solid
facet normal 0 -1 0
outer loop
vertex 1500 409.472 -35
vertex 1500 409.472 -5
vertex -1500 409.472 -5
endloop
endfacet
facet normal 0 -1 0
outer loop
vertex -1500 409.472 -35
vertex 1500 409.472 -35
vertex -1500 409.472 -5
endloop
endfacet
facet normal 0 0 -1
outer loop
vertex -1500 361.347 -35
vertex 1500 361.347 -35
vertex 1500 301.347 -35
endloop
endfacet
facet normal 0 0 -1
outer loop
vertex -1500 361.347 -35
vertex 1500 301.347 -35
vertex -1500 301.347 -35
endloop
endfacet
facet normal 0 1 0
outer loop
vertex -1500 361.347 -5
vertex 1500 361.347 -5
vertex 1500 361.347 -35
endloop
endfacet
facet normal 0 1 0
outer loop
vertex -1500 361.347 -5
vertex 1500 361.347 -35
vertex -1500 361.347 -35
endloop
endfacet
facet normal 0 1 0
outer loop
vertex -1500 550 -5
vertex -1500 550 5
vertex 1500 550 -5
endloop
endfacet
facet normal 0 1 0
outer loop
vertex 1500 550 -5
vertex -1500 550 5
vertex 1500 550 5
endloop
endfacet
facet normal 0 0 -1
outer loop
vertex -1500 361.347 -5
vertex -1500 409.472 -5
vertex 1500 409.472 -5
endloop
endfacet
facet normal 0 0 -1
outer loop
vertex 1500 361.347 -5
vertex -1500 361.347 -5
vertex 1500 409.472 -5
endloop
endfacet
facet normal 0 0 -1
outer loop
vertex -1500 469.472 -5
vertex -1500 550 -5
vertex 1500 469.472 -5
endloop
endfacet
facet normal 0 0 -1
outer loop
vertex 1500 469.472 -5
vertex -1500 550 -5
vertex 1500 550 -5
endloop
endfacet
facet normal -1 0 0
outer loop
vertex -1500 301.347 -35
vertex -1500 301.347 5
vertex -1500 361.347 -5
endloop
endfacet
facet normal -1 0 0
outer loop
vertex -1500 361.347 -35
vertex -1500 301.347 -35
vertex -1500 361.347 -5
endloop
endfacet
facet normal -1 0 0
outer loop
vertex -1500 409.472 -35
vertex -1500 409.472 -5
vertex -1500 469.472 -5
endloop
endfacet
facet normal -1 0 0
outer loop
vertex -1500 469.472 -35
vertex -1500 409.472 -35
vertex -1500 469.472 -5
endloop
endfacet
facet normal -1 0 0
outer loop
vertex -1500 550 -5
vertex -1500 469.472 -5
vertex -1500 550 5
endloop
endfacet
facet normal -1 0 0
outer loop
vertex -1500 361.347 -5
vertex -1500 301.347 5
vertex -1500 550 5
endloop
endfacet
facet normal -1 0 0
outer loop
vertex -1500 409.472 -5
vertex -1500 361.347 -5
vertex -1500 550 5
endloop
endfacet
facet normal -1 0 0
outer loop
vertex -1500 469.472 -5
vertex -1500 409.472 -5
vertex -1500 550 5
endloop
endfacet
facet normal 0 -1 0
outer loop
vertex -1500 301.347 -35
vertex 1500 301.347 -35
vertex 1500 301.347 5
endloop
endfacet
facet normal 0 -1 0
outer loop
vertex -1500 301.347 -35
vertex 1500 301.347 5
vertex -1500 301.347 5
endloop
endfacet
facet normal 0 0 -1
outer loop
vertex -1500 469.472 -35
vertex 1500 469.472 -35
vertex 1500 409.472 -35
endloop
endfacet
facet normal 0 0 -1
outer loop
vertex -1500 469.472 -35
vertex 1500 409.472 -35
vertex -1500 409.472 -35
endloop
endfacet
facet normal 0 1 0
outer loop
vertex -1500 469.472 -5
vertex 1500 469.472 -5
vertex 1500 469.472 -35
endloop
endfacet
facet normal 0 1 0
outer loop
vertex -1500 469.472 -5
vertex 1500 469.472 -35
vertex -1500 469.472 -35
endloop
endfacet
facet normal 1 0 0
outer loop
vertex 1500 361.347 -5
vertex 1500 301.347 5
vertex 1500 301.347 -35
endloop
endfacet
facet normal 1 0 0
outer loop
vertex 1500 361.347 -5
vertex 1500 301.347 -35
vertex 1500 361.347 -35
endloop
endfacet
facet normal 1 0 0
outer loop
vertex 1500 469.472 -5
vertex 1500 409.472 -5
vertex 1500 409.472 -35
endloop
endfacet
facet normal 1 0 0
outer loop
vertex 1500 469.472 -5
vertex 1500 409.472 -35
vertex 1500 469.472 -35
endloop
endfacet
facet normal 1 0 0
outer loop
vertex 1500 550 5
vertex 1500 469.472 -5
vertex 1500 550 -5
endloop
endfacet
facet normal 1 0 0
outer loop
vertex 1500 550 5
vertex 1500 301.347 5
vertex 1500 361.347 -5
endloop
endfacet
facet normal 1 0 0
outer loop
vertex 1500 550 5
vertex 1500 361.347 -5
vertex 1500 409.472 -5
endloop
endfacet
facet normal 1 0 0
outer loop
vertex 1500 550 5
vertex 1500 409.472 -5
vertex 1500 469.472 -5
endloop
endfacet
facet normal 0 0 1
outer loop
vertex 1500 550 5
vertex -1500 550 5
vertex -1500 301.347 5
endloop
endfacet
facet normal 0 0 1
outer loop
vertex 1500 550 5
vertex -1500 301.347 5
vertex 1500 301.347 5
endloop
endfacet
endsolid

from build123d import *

# Parameters (mm, degrees)
SKETCH1_W           = 3000
SKETCH1_H           = 1100
BOSS_EXTRUDE1_DEPTH = 5
SKETCH3_W           = 3000
SKETCH3_H           = 60
BOSS_EXTRUDE3_DEPTH = 30
SKETCH4_W           = 3000
SKETCH4_H           = 851.346620116
CUT_EXTRUDE1_DEPTH  = 1598.936168938


with BuildPart() as part:
    # Sketch1 → Boss-Extrude1 (new, symmetric)
    with BuildSketch(Plane.XY):
        Rectangle(SKETCH1_W, SKETCH1_H)
    extrude(amount=BOSS_EXTRUDE1_DEPTH, both=True)

    # Sketch3 → Boss-Extrude3 (add)
    with BuildSketch(Plane(origin=(0, 0, -5), x_dir=(-1, 0, 0), z_dir=(0, 0, -1))):
        with Locations((0, 439.471551707)):
            Rectangle(SKETCH3_W, SKETCH3_H)
        with Locations((0, 331.346620116)):
            Rectangle(SKETCH3_W, SKETCH3_H)
    extrude(amount=BOSS_EXTRUDE3_DEPTH)

    # Sketch4 → Cut-Extrude1 (cut, through all)
    with BuildSketch(Plane(origin=(0, 0, -5), x_dir=(-1, 0, 0), z_dir=(0, 0, -1))):
        with Locations((0, -124.326689942)):
            Rectangle(SKETCH4_W, SKETCH4_H)
    extrude(amount=-CUT_EXTRUDE1_DEPTH, mode=Mode.SUBTRACT)


solid = part.part
